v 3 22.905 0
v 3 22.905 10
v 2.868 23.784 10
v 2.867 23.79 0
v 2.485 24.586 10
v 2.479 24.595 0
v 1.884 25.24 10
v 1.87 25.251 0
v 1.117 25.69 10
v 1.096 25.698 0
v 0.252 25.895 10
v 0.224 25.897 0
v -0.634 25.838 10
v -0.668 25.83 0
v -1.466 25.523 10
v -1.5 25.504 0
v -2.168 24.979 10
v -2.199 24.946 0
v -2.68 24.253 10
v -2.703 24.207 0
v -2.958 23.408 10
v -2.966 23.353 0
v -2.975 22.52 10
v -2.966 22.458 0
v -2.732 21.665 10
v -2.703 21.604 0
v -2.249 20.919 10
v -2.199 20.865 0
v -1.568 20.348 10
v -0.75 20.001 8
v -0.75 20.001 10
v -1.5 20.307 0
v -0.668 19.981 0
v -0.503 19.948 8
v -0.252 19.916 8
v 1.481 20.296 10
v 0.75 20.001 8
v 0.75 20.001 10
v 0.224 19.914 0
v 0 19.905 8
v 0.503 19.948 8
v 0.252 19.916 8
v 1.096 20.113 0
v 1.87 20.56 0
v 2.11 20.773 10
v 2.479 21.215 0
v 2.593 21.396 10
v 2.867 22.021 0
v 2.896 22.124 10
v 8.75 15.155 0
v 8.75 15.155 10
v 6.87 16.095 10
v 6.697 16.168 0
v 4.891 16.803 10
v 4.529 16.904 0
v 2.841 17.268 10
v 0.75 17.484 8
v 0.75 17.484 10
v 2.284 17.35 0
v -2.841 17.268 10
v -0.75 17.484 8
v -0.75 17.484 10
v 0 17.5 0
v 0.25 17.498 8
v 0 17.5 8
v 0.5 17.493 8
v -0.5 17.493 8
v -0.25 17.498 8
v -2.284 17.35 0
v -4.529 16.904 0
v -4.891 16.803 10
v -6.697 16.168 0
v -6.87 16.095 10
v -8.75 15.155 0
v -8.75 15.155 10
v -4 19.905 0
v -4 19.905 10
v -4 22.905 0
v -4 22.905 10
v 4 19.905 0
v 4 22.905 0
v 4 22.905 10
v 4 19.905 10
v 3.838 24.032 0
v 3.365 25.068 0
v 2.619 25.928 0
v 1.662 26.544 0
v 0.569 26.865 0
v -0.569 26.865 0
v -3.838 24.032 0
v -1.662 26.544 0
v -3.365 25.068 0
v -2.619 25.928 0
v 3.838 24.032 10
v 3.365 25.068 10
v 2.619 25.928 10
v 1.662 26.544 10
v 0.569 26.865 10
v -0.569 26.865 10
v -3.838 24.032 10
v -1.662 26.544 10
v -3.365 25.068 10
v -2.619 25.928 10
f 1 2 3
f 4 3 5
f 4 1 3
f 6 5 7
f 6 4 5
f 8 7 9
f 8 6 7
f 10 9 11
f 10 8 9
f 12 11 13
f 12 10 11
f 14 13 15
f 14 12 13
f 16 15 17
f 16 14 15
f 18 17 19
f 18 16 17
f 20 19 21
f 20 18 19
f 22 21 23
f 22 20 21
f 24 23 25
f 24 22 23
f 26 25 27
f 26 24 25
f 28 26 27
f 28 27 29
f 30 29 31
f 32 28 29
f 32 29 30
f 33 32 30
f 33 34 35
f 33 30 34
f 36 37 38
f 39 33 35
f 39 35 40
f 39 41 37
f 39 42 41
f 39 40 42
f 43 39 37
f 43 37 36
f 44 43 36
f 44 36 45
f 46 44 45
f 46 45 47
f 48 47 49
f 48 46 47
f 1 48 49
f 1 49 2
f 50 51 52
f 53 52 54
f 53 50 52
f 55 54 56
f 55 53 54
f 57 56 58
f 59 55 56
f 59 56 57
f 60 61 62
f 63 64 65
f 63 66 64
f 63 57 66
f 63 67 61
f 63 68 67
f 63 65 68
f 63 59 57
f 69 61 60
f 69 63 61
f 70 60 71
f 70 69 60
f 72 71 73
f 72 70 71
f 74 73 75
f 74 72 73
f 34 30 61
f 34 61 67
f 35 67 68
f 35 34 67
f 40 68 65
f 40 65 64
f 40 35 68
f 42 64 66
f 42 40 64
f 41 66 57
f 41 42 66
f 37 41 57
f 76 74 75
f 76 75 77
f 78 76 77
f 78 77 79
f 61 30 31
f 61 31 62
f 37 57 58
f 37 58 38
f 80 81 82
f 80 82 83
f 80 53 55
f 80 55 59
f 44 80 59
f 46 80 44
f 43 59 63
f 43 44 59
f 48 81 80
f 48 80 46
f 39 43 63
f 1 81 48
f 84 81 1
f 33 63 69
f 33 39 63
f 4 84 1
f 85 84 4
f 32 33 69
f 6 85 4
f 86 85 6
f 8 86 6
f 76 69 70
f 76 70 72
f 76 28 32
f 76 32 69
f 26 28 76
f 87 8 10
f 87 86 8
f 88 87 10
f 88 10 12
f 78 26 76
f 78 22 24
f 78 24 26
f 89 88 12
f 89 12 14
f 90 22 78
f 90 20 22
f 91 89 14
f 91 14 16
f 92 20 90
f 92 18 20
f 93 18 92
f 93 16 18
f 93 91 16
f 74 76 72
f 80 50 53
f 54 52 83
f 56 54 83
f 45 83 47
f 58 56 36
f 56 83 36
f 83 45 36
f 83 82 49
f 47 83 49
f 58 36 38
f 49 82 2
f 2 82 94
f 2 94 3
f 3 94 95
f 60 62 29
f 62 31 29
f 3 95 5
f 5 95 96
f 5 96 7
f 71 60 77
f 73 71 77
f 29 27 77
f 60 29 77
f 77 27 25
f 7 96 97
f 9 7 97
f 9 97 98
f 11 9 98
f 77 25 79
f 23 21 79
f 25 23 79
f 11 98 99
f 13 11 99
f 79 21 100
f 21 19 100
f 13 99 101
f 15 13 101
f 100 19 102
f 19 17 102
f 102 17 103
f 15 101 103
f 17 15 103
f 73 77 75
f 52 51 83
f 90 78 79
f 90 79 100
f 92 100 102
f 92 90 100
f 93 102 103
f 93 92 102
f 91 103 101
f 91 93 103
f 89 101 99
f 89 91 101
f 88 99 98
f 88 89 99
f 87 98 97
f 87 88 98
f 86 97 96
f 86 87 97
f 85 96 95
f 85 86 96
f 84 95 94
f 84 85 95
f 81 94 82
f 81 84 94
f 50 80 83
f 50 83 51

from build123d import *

# Parameters (mm, degrees)
SKETCH1_R           = 3
BOSS_EXTRUDE1_DEPTH = 10
CUT_EXTRUDE1_START  = -2
CUT_EXTRUDE1_DEPTH  = 2


with BuildPart() as part:
    # Sketch1 → Boss-Extrude1 (new body)
    with BuildSketch(Plane.XY):
        with BuildLine():
            Line((-8.75, 15.155444566), (-4, 19.905444566))
            Line((-4, 19.905444566), (-4, 22.905444566))
            ThreePointArc((-4, 22.905444566), (0, 26.905444566), (4, 22.905444566))
            Line((4, 22.905444566), (4, 19.905444566))
            Line((4, 19.905444566), (8.75, 15.155444566))
            ThreePointArc((8.75, 15.155444566), (0, 17.5), (-8.75, 15.155444566))
        make_face()
        with Locations((0, 22.905444566)):
            Circle(SKETCH1_R, mode=Mode.SUBTRACT)
    extrude(amount=BOSS_EXTRUDE1_DEPTH)

    # Sketch3 → Cut-Extrude1 (cut)
    with BuildSketch(Plane.XY.offset(10).offset(CUT_EXTRUDE1_START)):
        with BuildLine():
            ThreePointArc((0.75, 20.000707057), (0.378012877, 19.929355477), (0, 19.905444566))
            Line((0, 19.905444566), (0, 18.799598559))
            Line((0, 18.799598559), (0.75, 18.799598559))
            Line((0.75, 18.799598559), (0.75, 20.000707057))
        make_face()
        with BuildLine():
            Line((0, 18.799598559), (0, 19.905444566))
            ThreePointArc((0, 19.905444566), (-0.378012877, 19.929355477), (-0.75, 20.000707057))
            Line((-0.75, 20.000707057), (-0.75, 18.799598559))
            Line((-0.75, 18.799598559), (0, 18.799598559))
        make_face()
        with BuildLine():
            Line((0.75, 18.799598559), (0, 18.799598559))
            Line((0, 18.799598559), (0, 17.5))
            ThreePointArc((0, 17.5), (0.375086166, 17.495979834), (0.75, 17.483921185))
            Line((0.75, 17.483921185), (0.75, 18.799598559))
        make_face()
        with BuildLine():
            Line((0, 17.5), (0, 18.799598559))
            Line((0, 18.799598559), (-0.75, 18.799598559))
            Line((-0.75, 18.799598559), (-0.75, 17.483921185))
            ThreePointArc((-0.75, 17.483921185), (-0.375086166, 17.495979834), (0, 17.5))
        make_face()
    extrude(amount=CUT_EXTRUDE1_DEPTH, mode=Mode.SUBTRACT)


solid = part.part
